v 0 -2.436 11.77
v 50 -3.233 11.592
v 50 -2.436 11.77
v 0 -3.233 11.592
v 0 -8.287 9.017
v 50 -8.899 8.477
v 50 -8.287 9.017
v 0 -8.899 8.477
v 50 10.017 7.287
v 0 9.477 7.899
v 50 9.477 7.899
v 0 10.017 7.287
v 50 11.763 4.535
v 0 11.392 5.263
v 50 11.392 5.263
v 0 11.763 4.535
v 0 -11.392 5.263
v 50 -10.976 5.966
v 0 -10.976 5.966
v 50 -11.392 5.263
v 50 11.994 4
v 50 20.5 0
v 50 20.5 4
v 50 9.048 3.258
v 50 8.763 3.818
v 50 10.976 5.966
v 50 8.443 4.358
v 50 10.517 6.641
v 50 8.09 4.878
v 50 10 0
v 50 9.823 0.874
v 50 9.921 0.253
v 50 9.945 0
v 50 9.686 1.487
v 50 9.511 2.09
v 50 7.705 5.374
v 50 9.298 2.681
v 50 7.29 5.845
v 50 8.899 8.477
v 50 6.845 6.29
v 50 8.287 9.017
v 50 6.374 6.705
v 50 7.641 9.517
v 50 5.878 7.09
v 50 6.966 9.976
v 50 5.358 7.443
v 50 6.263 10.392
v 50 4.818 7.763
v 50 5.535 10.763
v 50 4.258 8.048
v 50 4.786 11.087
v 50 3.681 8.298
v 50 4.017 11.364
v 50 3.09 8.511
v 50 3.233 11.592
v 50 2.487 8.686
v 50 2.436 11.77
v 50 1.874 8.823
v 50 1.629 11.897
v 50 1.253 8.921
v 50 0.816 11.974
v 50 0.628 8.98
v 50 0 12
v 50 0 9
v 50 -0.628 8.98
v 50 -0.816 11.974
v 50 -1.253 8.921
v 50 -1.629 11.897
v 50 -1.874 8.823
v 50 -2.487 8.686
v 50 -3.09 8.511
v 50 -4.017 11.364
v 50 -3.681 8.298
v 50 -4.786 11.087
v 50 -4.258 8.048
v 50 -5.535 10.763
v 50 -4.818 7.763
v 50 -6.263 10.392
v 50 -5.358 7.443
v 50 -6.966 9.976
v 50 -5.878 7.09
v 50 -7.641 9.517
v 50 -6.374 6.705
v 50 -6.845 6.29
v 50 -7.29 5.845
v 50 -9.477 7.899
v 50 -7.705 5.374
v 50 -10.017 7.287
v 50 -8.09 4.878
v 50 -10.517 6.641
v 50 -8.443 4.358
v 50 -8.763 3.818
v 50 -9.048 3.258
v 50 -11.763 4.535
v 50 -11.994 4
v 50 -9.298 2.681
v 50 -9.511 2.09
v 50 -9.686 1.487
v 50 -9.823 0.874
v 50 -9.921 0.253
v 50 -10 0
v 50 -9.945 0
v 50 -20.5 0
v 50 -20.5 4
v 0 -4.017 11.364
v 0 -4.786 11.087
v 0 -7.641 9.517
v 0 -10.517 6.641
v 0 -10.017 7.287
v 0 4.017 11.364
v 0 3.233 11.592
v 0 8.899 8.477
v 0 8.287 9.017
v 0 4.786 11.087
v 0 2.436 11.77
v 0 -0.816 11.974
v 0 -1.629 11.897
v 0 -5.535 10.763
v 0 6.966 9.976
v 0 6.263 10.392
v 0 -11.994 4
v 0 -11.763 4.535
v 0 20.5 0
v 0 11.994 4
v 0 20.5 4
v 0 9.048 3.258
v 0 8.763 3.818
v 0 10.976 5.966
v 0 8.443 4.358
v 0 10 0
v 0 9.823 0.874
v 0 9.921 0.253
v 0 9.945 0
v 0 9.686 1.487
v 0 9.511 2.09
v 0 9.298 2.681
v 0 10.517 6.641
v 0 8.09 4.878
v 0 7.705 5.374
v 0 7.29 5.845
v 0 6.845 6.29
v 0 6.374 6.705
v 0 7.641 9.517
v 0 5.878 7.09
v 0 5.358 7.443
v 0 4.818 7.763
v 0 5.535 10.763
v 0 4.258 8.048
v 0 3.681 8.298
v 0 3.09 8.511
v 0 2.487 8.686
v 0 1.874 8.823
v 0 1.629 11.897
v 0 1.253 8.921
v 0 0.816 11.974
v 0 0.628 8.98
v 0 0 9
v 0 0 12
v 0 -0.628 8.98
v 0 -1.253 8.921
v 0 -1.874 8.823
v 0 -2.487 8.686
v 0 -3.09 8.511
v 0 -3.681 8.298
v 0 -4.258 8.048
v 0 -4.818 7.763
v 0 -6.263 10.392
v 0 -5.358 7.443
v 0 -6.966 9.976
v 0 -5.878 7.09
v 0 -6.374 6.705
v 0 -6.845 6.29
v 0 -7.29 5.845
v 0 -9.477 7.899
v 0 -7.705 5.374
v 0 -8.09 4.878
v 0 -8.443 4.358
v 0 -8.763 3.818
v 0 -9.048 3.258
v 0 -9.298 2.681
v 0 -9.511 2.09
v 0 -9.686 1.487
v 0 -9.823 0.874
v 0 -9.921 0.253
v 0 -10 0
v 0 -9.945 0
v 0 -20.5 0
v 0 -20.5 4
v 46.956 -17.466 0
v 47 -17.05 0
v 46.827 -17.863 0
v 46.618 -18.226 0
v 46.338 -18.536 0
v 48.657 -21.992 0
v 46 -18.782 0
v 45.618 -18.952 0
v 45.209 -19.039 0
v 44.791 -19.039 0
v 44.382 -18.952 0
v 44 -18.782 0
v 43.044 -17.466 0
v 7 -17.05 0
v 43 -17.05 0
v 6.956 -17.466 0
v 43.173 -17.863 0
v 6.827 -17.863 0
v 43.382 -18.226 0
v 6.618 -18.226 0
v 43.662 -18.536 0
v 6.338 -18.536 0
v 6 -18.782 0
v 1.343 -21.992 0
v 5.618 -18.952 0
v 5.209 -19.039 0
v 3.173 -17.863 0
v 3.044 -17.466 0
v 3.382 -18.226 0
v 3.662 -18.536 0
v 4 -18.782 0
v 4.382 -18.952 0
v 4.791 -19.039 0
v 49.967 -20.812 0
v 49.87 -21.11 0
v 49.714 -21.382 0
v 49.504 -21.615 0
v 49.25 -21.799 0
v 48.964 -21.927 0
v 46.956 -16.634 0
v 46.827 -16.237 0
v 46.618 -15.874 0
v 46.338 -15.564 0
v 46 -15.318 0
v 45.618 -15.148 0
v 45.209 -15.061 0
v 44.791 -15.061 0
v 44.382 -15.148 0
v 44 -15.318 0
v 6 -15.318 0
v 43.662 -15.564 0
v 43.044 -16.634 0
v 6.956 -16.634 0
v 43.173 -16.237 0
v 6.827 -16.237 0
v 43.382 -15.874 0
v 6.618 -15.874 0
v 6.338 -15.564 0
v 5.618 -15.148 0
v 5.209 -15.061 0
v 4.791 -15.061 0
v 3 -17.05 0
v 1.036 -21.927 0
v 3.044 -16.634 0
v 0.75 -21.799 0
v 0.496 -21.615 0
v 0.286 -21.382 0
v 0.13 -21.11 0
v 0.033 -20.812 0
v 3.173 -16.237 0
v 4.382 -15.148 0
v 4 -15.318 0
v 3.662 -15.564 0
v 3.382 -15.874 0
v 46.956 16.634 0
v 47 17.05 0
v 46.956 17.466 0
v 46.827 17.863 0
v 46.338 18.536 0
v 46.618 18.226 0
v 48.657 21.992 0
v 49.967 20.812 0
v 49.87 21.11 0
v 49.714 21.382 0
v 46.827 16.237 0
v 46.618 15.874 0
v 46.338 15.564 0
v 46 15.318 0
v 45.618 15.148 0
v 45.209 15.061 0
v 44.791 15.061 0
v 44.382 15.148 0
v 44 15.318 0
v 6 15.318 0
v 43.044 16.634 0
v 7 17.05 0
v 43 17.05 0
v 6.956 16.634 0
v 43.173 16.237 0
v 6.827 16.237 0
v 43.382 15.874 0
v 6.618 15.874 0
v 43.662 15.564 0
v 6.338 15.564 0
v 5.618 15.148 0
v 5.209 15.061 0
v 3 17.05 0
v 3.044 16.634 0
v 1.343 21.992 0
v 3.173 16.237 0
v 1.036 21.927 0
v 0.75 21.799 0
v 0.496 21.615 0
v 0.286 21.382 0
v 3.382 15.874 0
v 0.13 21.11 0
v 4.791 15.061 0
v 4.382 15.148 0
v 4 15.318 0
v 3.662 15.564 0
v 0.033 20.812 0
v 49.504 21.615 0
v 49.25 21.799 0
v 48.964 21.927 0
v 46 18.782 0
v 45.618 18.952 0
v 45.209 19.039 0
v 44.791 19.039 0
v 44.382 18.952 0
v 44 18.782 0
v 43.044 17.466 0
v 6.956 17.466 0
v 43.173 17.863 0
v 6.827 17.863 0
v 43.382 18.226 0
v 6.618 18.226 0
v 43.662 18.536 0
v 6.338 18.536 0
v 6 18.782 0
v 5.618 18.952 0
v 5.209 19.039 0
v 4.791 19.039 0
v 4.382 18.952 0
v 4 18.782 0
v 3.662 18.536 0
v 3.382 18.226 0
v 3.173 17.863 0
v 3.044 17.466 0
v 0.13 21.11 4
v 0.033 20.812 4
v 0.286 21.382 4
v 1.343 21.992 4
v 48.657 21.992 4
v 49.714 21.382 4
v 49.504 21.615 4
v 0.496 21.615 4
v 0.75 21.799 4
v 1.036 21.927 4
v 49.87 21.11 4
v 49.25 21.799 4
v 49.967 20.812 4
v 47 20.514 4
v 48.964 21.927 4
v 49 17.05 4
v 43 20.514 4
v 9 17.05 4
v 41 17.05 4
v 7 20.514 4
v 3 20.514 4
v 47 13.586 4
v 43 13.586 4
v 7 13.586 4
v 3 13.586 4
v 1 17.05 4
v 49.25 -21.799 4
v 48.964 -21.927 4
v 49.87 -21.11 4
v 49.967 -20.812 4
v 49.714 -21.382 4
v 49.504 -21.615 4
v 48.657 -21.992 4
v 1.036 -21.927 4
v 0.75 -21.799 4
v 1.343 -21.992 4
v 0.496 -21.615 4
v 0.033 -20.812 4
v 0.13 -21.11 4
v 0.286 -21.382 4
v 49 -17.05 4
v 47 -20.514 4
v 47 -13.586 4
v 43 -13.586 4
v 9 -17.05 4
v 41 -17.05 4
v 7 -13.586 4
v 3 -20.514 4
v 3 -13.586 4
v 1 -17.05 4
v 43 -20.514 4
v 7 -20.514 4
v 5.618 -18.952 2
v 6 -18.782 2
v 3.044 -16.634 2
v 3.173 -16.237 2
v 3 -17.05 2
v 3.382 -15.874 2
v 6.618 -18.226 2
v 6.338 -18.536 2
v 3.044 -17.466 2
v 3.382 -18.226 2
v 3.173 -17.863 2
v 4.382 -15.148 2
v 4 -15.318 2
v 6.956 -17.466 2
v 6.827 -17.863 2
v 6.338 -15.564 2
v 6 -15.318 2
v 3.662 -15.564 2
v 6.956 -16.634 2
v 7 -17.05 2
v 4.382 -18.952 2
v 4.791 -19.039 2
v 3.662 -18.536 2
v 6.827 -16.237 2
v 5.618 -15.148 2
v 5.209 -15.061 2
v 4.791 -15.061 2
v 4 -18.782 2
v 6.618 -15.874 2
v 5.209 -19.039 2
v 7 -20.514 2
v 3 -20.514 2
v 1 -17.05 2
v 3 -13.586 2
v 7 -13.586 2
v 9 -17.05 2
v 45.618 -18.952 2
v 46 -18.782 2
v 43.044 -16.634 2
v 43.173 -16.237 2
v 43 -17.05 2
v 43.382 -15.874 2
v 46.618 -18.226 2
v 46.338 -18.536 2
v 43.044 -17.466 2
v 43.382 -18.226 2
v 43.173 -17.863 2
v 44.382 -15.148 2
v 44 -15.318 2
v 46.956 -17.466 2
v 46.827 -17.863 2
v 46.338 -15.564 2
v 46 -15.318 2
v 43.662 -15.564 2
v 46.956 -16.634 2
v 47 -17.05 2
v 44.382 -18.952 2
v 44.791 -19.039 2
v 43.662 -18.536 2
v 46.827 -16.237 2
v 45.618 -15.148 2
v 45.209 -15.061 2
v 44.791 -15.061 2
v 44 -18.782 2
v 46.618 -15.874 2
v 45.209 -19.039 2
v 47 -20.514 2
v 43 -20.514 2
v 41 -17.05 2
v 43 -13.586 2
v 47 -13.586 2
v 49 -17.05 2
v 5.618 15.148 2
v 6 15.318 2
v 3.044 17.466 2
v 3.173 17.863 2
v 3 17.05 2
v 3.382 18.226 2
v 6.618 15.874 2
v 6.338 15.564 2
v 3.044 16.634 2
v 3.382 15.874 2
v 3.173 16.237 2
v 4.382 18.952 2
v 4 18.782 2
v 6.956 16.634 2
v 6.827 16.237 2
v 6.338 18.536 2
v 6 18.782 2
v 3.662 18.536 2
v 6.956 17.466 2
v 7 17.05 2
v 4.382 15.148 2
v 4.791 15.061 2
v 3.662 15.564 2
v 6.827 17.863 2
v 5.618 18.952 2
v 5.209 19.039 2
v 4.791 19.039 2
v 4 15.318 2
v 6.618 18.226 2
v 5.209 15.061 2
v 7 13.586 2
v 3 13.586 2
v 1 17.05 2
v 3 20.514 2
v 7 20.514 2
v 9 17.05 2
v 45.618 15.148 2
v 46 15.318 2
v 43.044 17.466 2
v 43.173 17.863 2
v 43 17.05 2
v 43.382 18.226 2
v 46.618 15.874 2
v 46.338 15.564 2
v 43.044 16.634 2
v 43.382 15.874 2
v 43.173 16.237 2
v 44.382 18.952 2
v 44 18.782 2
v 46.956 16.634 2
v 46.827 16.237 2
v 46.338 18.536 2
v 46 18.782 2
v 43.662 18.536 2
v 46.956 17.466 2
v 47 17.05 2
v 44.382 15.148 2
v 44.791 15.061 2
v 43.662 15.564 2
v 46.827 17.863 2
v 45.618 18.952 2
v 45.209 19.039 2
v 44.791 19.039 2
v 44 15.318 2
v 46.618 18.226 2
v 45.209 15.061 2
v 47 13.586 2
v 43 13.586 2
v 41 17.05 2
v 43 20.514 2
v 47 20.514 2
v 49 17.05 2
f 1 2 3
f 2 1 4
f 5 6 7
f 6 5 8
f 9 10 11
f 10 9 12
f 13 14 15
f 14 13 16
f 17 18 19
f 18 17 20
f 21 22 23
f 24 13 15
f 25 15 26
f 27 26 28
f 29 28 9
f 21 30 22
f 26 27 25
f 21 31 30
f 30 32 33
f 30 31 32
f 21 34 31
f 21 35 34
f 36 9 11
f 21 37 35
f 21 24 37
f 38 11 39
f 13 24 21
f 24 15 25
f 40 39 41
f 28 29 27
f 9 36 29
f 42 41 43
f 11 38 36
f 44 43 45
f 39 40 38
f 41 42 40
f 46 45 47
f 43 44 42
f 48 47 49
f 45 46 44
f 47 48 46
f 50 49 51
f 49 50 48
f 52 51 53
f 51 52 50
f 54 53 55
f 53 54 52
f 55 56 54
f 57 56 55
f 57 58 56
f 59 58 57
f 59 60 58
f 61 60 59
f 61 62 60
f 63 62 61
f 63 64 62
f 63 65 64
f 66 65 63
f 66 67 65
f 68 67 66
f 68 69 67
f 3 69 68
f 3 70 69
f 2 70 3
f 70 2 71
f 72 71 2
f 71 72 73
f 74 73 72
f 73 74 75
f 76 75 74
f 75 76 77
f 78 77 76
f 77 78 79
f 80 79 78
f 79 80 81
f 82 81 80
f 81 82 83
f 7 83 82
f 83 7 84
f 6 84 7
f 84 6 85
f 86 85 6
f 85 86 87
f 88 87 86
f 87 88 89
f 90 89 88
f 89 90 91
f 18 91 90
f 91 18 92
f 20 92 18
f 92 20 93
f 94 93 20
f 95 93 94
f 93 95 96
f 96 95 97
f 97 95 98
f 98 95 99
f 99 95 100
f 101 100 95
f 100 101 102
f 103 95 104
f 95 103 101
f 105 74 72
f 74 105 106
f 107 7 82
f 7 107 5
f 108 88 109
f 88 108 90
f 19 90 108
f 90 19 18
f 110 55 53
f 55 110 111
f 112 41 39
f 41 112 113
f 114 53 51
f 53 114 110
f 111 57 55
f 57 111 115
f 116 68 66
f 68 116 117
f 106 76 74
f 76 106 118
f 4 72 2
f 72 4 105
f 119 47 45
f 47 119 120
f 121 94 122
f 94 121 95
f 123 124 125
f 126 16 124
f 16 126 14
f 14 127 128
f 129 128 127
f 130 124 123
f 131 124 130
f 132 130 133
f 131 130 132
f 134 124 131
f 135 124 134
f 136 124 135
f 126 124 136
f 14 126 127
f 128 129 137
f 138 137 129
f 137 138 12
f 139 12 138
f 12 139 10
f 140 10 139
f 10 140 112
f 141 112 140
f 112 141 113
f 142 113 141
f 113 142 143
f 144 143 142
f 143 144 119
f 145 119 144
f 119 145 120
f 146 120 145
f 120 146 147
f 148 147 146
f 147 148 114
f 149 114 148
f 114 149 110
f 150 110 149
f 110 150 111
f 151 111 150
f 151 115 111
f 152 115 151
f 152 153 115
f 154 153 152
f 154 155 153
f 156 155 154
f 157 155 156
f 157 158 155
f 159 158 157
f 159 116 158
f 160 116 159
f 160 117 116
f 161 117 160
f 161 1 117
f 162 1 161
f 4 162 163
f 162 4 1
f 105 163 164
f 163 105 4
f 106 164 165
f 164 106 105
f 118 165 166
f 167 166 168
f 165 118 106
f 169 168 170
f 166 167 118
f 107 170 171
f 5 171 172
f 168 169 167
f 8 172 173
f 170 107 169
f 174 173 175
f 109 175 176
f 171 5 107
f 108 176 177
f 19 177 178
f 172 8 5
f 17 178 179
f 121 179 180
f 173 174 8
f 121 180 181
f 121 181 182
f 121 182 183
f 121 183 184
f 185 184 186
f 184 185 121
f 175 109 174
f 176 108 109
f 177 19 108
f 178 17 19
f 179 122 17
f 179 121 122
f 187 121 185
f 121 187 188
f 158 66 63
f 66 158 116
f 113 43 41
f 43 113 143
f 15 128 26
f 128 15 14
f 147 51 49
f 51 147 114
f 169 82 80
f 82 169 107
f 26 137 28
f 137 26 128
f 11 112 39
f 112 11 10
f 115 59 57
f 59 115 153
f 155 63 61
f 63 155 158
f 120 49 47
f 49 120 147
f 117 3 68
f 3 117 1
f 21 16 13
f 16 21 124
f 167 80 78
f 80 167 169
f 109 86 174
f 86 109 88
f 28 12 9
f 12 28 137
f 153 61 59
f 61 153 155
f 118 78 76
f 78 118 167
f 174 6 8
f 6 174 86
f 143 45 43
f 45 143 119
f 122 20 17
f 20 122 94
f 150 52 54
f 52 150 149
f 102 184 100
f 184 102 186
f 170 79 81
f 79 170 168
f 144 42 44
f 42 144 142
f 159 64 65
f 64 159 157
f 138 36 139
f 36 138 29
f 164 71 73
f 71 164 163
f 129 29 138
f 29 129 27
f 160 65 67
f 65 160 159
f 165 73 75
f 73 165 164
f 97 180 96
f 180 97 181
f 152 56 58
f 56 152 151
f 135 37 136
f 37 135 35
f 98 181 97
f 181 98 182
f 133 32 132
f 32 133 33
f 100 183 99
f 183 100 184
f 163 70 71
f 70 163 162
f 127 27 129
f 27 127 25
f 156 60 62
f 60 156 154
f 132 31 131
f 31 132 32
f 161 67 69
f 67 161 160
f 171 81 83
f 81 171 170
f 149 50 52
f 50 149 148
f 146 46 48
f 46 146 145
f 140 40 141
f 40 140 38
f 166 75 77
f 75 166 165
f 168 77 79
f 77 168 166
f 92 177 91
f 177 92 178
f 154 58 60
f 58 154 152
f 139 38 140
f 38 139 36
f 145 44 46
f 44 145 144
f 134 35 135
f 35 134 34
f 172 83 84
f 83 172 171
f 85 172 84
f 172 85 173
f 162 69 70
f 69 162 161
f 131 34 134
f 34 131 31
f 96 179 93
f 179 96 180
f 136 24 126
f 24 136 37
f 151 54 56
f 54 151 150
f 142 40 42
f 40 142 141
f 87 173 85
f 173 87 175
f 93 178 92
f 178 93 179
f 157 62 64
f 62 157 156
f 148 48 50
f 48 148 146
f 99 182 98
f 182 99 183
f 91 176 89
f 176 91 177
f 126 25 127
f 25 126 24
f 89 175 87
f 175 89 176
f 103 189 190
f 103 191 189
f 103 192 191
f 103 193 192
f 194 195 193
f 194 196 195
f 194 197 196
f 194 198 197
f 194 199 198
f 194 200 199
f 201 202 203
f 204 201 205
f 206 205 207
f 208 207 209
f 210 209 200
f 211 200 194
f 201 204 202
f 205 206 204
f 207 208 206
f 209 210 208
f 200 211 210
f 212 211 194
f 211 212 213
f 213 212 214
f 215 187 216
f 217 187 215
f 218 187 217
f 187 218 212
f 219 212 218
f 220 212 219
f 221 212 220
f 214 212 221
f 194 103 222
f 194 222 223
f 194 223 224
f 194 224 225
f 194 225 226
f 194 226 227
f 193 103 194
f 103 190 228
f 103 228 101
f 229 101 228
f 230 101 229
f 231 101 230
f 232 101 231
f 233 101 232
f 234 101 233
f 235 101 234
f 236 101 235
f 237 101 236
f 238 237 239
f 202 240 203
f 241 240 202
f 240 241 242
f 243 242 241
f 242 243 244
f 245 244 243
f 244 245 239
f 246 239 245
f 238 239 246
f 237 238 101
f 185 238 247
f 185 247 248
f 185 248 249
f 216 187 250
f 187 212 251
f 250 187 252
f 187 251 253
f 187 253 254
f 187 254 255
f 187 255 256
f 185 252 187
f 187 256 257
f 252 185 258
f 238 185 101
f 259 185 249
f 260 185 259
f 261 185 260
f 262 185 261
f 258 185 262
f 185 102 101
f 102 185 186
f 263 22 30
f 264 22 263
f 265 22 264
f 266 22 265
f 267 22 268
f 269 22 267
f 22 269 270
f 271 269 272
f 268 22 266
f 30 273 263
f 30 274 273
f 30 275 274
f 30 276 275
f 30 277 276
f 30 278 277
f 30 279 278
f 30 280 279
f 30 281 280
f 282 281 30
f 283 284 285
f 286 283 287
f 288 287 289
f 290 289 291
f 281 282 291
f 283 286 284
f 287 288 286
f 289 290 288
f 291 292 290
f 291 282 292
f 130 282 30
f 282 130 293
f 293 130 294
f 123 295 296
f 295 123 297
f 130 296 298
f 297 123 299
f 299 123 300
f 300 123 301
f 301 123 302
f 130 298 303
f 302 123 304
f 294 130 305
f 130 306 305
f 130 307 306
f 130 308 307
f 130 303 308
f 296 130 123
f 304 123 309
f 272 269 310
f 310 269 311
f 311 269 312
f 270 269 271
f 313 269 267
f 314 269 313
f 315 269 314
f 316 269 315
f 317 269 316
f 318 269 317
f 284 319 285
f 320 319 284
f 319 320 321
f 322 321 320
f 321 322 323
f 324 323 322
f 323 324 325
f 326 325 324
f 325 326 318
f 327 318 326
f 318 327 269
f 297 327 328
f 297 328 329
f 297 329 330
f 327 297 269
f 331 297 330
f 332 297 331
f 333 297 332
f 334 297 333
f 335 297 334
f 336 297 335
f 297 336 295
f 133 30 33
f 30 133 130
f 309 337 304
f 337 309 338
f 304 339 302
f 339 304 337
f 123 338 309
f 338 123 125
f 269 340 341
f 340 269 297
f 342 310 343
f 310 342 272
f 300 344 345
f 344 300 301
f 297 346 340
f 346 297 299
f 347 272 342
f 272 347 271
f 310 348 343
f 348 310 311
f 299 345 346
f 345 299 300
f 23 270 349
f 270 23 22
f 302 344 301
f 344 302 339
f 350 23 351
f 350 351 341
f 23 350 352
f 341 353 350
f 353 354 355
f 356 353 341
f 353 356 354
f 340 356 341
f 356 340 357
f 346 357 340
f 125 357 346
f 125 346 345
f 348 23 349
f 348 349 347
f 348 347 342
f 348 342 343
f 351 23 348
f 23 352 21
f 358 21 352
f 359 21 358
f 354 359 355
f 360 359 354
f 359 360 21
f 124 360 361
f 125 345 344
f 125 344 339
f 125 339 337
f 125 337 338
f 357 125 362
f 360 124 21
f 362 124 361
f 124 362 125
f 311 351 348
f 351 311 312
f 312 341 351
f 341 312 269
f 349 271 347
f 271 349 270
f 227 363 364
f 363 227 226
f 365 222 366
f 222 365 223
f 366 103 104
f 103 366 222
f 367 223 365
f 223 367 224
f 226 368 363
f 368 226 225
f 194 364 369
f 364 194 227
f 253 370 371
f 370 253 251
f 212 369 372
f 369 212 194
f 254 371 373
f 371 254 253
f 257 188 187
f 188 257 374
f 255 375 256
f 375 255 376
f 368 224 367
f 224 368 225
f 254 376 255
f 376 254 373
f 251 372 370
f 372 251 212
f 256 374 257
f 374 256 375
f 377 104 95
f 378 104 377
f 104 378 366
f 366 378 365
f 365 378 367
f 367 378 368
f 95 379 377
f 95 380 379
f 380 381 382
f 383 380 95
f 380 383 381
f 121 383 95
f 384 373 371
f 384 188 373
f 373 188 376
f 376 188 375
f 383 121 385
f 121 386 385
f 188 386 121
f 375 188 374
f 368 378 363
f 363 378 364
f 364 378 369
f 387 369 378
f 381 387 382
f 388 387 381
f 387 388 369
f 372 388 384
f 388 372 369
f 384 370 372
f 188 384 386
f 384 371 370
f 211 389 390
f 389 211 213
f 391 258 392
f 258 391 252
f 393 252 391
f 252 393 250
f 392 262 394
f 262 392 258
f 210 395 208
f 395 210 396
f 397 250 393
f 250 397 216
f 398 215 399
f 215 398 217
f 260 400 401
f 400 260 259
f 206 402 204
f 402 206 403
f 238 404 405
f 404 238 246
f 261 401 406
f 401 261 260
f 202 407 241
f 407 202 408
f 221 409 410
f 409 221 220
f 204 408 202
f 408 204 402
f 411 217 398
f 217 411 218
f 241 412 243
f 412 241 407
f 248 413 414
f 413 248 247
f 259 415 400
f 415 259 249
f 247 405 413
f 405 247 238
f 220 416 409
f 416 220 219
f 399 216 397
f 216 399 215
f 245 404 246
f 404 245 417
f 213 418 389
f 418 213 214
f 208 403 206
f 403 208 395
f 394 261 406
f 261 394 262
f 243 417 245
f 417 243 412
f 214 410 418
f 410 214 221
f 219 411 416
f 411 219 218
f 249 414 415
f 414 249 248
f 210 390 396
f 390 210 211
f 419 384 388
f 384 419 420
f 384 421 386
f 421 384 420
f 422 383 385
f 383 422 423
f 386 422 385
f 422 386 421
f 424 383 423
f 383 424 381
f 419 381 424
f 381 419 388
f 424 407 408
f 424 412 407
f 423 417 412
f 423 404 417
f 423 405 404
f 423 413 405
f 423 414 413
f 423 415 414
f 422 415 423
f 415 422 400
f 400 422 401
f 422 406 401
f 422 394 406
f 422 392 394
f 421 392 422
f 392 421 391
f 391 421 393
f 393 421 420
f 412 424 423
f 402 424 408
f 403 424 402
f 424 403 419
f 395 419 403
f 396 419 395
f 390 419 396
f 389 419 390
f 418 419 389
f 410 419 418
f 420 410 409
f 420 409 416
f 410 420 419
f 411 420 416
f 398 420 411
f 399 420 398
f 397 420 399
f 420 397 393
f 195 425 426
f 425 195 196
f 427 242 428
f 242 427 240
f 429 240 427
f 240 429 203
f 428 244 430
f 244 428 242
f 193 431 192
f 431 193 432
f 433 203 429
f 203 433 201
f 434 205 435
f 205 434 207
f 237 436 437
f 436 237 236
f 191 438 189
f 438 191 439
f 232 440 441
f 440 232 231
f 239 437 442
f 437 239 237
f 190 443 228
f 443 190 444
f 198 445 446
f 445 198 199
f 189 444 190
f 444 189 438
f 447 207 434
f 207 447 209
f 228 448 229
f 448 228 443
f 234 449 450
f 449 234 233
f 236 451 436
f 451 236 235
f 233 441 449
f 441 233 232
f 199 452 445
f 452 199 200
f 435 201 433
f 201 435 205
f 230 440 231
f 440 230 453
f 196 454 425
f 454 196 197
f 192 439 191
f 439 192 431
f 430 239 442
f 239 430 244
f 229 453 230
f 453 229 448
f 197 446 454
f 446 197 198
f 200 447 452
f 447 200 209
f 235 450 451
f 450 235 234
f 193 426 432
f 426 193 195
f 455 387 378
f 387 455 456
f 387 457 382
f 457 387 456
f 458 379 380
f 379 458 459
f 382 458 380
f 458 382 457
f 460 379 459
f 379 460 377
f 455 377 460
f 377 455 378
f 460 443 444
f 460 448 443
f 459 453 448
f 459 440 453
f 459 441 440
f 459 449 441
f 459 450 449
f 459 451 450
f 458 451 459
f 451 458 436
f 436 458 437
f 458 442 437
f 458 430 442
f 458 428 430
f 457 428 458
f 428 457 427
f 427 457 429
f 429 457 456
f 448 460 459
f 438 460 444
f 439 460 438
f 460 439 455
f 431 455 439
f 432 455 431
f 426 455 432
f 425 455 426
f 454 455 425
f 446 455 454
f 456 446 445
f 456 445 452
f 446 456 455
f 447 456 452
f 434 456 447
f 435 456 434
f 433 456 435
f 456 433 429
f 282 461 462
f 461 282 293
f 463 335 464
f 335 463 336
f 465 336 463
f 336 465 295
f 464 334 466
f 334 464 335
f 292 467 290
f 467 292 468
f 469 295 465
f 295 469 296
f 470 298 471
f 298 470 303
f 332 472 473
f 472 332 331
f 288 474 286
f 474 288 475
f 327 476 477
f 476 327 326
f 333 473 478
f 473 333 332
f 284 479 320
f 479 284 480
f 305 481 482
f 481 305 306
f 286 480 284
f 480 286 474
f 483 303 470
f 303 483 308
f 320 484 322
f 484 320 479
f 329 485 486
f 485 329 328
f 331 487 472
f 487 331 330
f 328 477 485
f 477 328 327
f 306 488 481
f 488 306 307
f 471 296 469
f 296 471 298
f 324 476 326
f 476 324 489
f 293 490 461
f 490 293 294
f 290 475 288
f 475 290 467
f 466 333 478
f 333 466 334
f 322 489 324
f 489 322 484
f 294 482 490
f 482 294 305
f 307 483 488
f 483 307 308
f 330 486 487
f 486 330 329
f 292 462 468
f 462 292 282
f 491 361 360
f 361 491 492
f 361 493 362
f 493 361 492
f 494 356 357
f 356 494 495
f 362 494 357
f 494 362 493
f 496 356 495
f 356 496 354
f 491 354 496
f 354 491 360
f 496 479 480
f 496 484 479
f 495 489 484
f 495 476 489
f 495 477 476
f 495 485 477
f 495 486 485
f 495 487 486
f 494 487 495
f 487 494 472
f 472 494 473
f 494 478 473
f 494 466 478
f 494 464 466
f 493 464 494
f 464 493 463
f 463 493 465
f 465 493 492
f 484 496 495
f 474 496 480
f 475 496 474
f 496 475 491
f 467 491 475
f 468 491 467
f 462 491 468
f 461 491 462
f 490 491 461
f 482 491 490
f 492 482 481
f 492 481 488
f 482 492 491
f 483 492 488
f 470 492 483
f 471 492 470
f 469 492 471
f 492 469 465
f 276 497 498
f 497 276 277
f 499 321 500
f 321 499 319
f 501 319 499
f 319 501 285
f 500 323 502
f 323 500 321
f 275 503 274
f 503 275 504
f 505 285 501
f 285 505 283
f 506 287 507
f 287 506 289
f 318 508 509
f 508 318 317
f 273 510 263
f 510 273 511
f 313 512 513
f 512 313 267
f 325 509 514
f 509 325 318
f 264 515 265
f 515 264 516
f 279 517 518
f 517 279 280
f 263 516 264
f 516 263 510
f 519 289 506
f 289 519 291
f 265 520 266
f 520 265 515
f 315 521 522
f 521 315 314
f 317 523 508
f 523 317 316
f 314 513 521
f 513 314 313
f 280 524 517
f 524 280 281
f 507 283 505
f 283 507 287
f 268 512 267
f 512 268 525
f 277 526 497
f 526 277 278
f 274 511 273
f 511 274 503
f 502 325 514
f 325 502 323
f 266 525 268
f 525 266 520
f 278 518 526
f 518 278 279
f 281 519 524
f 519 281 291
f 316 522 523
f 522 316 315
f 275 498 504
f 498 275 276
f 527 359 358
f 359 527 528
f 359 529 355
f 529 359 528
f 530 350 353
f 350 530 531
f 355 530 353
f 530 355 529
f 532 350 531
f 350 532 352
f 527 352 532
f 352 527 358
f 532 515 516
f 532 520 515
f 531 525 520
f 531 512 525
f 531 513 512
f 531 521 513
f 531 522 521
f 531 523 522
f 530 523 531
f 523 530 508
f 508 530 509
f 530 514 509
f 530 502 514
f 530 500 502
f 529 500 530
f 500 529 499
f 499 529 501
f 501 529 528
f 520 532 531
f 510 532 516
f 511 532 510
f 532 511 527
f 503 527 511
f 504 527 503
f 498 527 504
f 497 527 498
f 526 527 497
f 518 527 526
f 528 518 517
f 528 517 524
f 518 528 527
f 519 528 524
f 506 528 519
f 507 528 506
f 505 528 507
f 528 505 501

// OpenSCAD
// *********************************************
//
// Customizable/parametric clamp script
// Author: indazoo
// Credits : 
//   bardiir   https://www.thingiverse.com/thing:2427479
//   Marko22   https://www.thingiverse.com/thing:2484467
//
// *********************************************

/* [Clamp Definitions] */

//Diameter of the rod or pipe to clamp
clamp_inner_diameter = 20; //[1:200]

//Clamps need some space to apply pressure.
clamp_diameter_offset = 1; //[0:200]

//Clamp length
clamp_length = 50; //[1:200]

//Wall thickness
clamp_wall_thickness = 3; //[1:20]

/* [Plate Definitions] */

//Plate thickness where the screw holes are.
wall_plate_thickness = 4; //[1:20]

//Border around the screw recess.
wall_plate_border = 1; //[1:20]

/* [Screw Definitions] */

//Count of screw holes to be places alongside each side.
num_screws = 2; //[0:20]

//Diameter of screw holes.
screw_diameter = 4; //[1:15]

//Distance of opposite screws. Useful for repair parts where the screw/bolt distance must match. Must be at least larger than the clamps inner diameter. Zero disables this and gives automatic distance depending of clamp size.
screw_opposite_distance = 0; //[0:200]

//Distance for the first and the last screw from the edge. Zero disables this so the holes will placed according to plate border value.
screw_distance_from_edge = 0; //[0:100]

//Diameter of nut trap or screw head diameter (set to 0 to disable).
screw_recess_diameter = 8; //[0:20] 

//Make a recess as nut or round shape.
screw_recess_shape = "nut"; //[nut,round]

//How deep the recess is. Set to zero to get a flat clamp plate.
screw_head_nut_thickness = 2; //[0:20]

/* [Hidden] */
plate_r = clamp_wall_thickness/2;

// Output for thingiverse customizer//

rotate([0,90,0])
clamp(clamp_inner_diameter = clamp_inner_diameter,
            clamp_diameter_offset = clamp_diameter_offset,
            clamp_length = clamp_length,
            clamp_wall_thickness = clamp_wall_thickness,
            wall_plate_thickness = wall_plate_thickness,
            wall_plate_border = wall_plate_border,
            num_screws = num_screws,
            screw_diameter = screw_diameter,
            screw_opposite_distance = screw_opposite_distance,
            screw_distance_from_edge = screw_distance_from_edge,
            screw_recess_diameter = screw_recess_diameter,
            screw_recess_is_nut = screw_recess_shape == "nut" ? true : false,
            screw_head_nut_thickness= screw_head_nut_thickness);


// ************************************
// Samples / output for STL picture
// ************************************
/*
// narrow one screw clamp
translate([0,0,0])
rotate([0,90,0])
clamp(clamp_inner_diameter = 20,
            clamp_diameter_offset = 1,
            clamp_length = 12,
            clamp_wall_thickness = 3,
            wall_plate_thickness = 4,
            wall_plate_border = 2,
            num_screws = 1,
            screw_diameter = 4,
            screw_opposite_distance = 0,
            screw_distance_from_edge = 0,
            screw_recess_diameter = 8,
            screw_recess_is_nut = false,
            screw_head_nut_thickness = 2) ; 
            
translate([15,0,0])
rotate([0,90,0])
clamp(clamp_inner_diameter = 20,
            clamp_diameter_offset = 1,
            clamp_length = 12,
            clamp_wall_thickness = 3,
            wall_plate_thickness = 4,
            wall_plate_border = 2,
            num_screws = 1,
            screw_diameter = 4,
            screw_opposite_distance = 0,
            screw_distance_from_edge = 0,
            screw_recess_diameter = 8,
            screw_recess_is_nut = true,
            screw_head_nut_thickness = 2) ;

// narrow one screw clamp without recess at fixed distance
translate([50,0,0])
rotate([0,90,0])
clamp(clamp_inner_diameter = 20,
            clamp_diameter_offset = 1,
            clamp_length = 12,
            clamp_wall_thickness = 3,
            wall_plate_thickness = 8,
            wall_plate_border = 2,
            num_screws = 1,
            screw_diameter = 4,
            screw_opposite_distance = 36, 
            screw_distance_from_edge = 0,
            screw_recess_diameter = 8,
            screw_recess_is_nut = false,
            screw_head_nut_thickness = 0) ; 
            
translate([65,0,0])
rotate([0,90,0])
clamp(clamp_inner_diameter = 20,
            clamp_diameter_offset = 1,
            clamp_length = 12,
            clamp_wall_thickness = 3,
            wall_plate_thickness = 8,
            wall_plate_border = 2,
            num_screws = 1,
            screw_diameter = 4,
            screw_opposite_distance = 36,
            screw_distance_from_edge = 0,
            screw_recess_diameter = 8,
            screw_recess_is_nut = true,
            screw_head_nut_thickness = 0) ;

            
// Dual screw clamp
translate([0,45,0])
rotate([0,90,0])
clamp(clamp_inner_diameter = 10,
            clamp_diameter_offset = 1,
            clamp_length = 40,
            clamp_wall_thickness = 3,
            wall_plate_thickness = 4,
            wall_plate_border = 1,
            num_screws = 2,
            screw_diameter = 4,
            screw_opposite_distance = 0,
            screw_distance_from_edge = 10,
            screw_recess_diameter = 8,
            screw_recess_is_nut = true,
            screw_head_nut_thickness = 2) ;
translate([50,45,0])
rotate([0,90,0])
clamp(clamp_inner_diameter = 10,
            clamp_diameter_offset = 1,
            clamp_length = 40,
            clamp_wall_thickness = 3,
            wall_plate_thickness = 4,
            wall_plate_border = 1,
            num_screws = 2,
            screw_diameter = 4,
            screw_opposite_distance = 0,
            screw_distance_from_edge = 10,
            screw_recess_diameter = 8,
            screw_recess_is_nut = false,
            screw_head_nut_thickness = 0) ;

// triple screw clamp
translate([0,90,0])
rotate([0,90,0])
clamp(clamp_inner_diameter = 20,
            clamp_diameter_offset = 1,
            clamp_length = 40,
            clamp_wall_thickness = 3,
            wall_plate_thickness = 4,
            wall_plate_border = 1,
            num_screws = 3,
            screw_diameter = 4,
            screw_opposite_distance = 0,
            screw_distance_from_edge = 0,
            screw_recess_diameter = 8,
            screw_recess_is_nut = true,
            screw_head_nut_thickness = 2) ;
translate([50,90,0])
rotate([0,90,0])
clamp(clamp_inner_diameter = 20,
            clamp_diameter_offset = 1,
            clamp_length = 50,
            clamp_wall_thickness = 3,
            wall_plate_thickness = 4,
            wall_plate_border = 1,
            num_screws = 3,
            screw_diameter = 4,
            screw_opposite_distance = 0,
            screw_distance_from_edge = 10,
            screw_recess_diameter = 8,
            screw_recess_is_nut = false,
            screw_head_nut_thickness = 0) ;
*/            
// *****************************************************
// Code
// *****************************************************
           

module clamp(clamp_inner_diameter = 20,
            clamp_diameter_offset = 1,
            clamp_length = 50,
            clamp_wall_thickness = 3,
            wall_plate_thickness = 4,
            wall_plate_border = 1,
            num_screws = 2,
            screw_diameter = 4,
            screw_opposite_distance = 0,
            screw_distance_from_edge = 10,
            screw_recess_diameter = 8,
            screw_recess_is_nut = true,
            screw_head_nut_thickness = 2) 
{
    plate_length_p = plate_length(
                        screw_opposite_distance = screw_opposite_distance,
                        wall_plate_border = wall_plate_border,
                        clamp_wall_thickness = clamp_wall_thickness,
                        clamp_inner_diameter = clamp_inner_diameter, 
                        screw_recess_is_nut = screw_recess_is_nut,
                        screw_recess_diameter = screw_recess_diameter);
    screwhole_distance_from_edge_p = screwhole_distance_from_edge(
                                        num_screws = num_screws,
                                        clamp_length = clamp_length,
                                        screw_distance_from_edge = screw_distance_from_edge,
                                        wall_plate_border = wall_plate_border,
                                        screw_recess_diameter = screw_recess_diameter
                                        );
    screwhole_distance_p = screwhole_distance(num_screws = num_screws,
                            clamp_length = clamp_length,
                            screwhole_distance_from_edge = screwhole_distance_from_edge_p
                            );
    difference()
    {
        //create clamp structure
        union()
        {
            translate([clamp_diameter_offset,0,0])
            difference() 
            {
                cylinder(d=clamp_inner_diameter+clamp_wall_thickness*2,h=clamp_length,$fn=100);
                translate([0,0,-1])
                //remove inner cylinder
                cylinder(d=clamp_inner_diameter,h=clamp_length+2,$fn=100);
                //cut half of clamp
                translate([-clamp_diameter_offset,
                            -(clamp_inner_diameter+clamp_wall_thickness*16)/2,
                            -clamp_length/2])
                    cube([(clamp_inner_diameter+clamp_wall_thickness)*2+1,
                        clamp_inner_diameter+clamp_wall_thickness*16,
                        clamp_length*2]);
            }
            //add plates on the left/right
            translate([0,
                        plate_center_x(clamp_inner_diameter = clamp_inner_diameter,
                                        plate_length = plate_length_p),
                        clamp_length/2])
            rotate([180,0,0])
            plate(plate_length = plate_length_p,
                    wall_plate_thickness = wall_plate_thickness,
                    clamp_length = clamp_length);
            translate([0,
                        -plate_center_x(clamp_inner_diameter = clamp_inner_diameter,
                                        plate_length = plate_length_p),
                        clamp_length/2])
            plate(plate_length = plate_length_p,
                    wall_plate_thickness = wall_plate_thickness,
                    clamp_length = clamp_length);
        }
        //remove screw holes
        if(num_screws > 0)
        {
            translate([0,-screw_center_x(screw_opposite_distance = screw_opposite_distance, 
                            clamp_inner_diameter = clamp_inner_diameter,
                            wall_plate_border = wall_plate_border,
                            screw_recess_is_nut = screw_recess_is_nut,
                            screw_recess_diameter = screw_recess_diameter,
                            plate_length = plate_length_p),
                        0])
               recess(num_screws = num_screws,
                        screw_diameter = screw_diameter, 
                        wall_plate_thickness = wall_plate_thickness,
                        screw_head_nut_thickness = screw_head_nut_thickness,
                        screw_recess_is_nut = screw_recess_is_nut,
                        screw_recess_diameter = screw_recess_diameter,
                        recess_height = screw_head_nut_thickness,
                        screwhole_distance_from_edge = screwhole_distance_from_edge_p,
                        screwhole_distance = screwhole_distance_p);
            translate([0,+screw_center_x(screw_opposite_distance = screw_opposite_distance, 
                            clamp_inner_diameter = clamp_inner_diameter,
                            wall_plate_border = wall_plate_border,
                            screw_recess_is_nut = screw_recess_is_nut,
                            screw_recess_diameter = screw_recess_diameter,
                            plate_length = plate_length_p),
                        0])
                recess(num_screws = num_screws,
                        screw_diameter = screw_diameter, 
                        wall_plate_thickness = wall_plate_thickness,
                        screw_head_nut_thickness = screw_head_nut_thickness,
                        screw_recess_is_nut = screw_recess_is_nut,
                        screw_recess_diameter = screw_recess_diameter,
                        recess_height = screw_head_nut_thickness,
                        screwhole_distance_from_edge = screwhole_distance_from_edge_p,
                        screwhole_distance = screwhole_distance_p);
        }
    }
}

//this function would minimize the width of the clamp but then the counterpart may not have the same width
function screw_recess_virtual_diameter(screw_recess_is_nut = true, 
                                        screw_recess_diameter = 8)
            //0.88 is relation between diameter of nut versus width of flat sides
            //= (screw_recess_is_nut ? screw_recess_diameter*0.88 : screw_recess_diameter);
            = screw_recess_diameter;

function plate_length(screw_opposite_distance = 0,
                    wall_plate_border = 2,
                    clamp_wall_thickness = 3,
                    clamp_inner_diameter = 20, 
                    screw_recess_is_nut = true,
                    screw_recess_diameter = 8
                    )
            = screw_opposite_distance == 0 ?
                screw_recess_virtual_diameter(screw_recess_is_nut = screw_recess_is_nut, 
                                        screw_recess_diameter = screw_recess_diameter)
                + wall_plate_border
                + clamp_wall_thickness
            : (screw_opposite_distance - clamp_inner_diameter)/2 
                + screw_recess_virtual_diameter(screw_recess_is_nut = screw_recess_is_nut, 
                                        screw_recess_diameter = screw_recess_diameter)/2
                + wall_plate_border ;

function plate_center_x(clamp_inner_diameter=20, 
                        plate_length = 10) 
            = clamp_inner_diameter/2 + plate_length/2;

function screw_center_x(screw_opposite_distance = 0, 
                        clamp_inner_diameter = 20,
                        wall_plate_border = 2,
                        screw_recess_is_nut = true,
                        screw_recess_diameter = 8,
                        plate_length = 10
                        ) 
            = screw_opposite_distance > 0 ?
            screw_opposite_distance/2
            :clamp_inner_diameter/2 
                + plate_length 
                - wall_plate_border 
                - screw_recess_virtual_diameter(screw_recess_is_nut = screw_recess_is_nut,
                                                screw_recess_diameter = screw_recess_diameter)/2
                +0.05 ; //correction factor because screw_recess_virtual_diameter() is not exact to prevent ultra thin wall with border = 0

function screwhole_distance_from_edge(num_screws = 2,
                                    clamp_length = 50,
                                    screw_distance_from_edge = 0,
                                    wall_plate_border = 2,
                                    screw_recess_diameter = 8
                                    )
            =
   num_screws == 1 ? clamp_length/2
   : screw_distance_from_edge == 0 || 2*screw_distance_from_edge > clamp_length ? wall_plate_border + screw_recess_diameter/2
   : screw_distance_from_edge; 

function screwhole_distance(num_screws = 2,
                            clamp_length = 50,
                            screwhole_distance_from_edge = 10
                            )
           = num_screws == 1 ? 0 : (clamp_length - 2*screwhole_distance_from_edge) / (num_screws-1) ;

/*
echo("clamp_length",clamp_length);
echo("screwhole_distance_from_edge()",screwhole_distance_from_edge());
echo("screwhole_distance()",screwhole_distance());
echo(clamp_length-screwhole_distance_from_edge()-(screwhole_distance()*1));
*/

module plate(plate_length = 10, wall_plate_thickness = 4, clamp_length = 50)
{
    translate([-wall_plate_thickness,0,0])
    rotate([0,90,0])
    roundedRect([clamp_length,plate_length,wall_plate_thickness],plate_r , $fn=30);
}

module recess(num_screws = 2,
                screw_diameter = 4, 
                wall_plate_thickness = 4,
                screw_head_nut_thickness = 3,
                screw_recess_is_nut = true,
                screw_recess_diameter = true,
                recess_height = 3,
                screwhole_distance_from_edge = 10,
                screwhole_distance = 0
             )
{
    if(num_screws>0)
    {
        for(i=[0:num_screws-1])
        {
            translate([0,0,screwhole_distance_from_edge+screwhole_distance*i])
                screwhole(screw_diameter = screw_diameter, 
                        wall_plate_thickness = wall_plate_thickness,
                        screw_head_nut_thickness = screw_head_nut_thickness,
                        screw_recess_is_nut = screw_recess_is_nut,
                        screw_recess_diameter = screw_recess_diameter,
                        recess_height = recess_height
                        );
        }
    }
}


module screwhole(screw_diameter = 4, 
                wall_plate_thickness = 4,
                screw_head_nut_thickness = 3,
                screw_recess_is_nut = true,
                screw_recess_diameter = true,
                recess_height = 3
                )
{
    rotate([0,90,0])
    union() {
        cylinder(d=screw_diameter, h=wall_plate_thickness+20, $fn=30, center=true);
        if(screw_head_nut_thickness > 0)
        {
            translate([0,0,(-(20+recess_height)/2)- (recess_height == 0 ? wall_plate_thickness +0.01: wall_plate_thickness-recess_height) ])
            if(screw_recess_is_nut)
                cylinder(d=screw_recess_diameter, h=recess_height+20, $fn=6, center=true);
            else
                cylinder(d=screw_recess_diameter, h=recess_height+20, $fn=30, center=true);
        }
    }
}

// size - [x,y,z]
// radius - radius of corners
module roundedRect(size, radius)
{
	x = size[0]-radius;
	y = size[1]-radius;
	z = size[2];

	linear_extrude(height=z)
	hull()
	{
		// place 4 circles in the corners, with the given radius
		translate([(-x/2)+(radius/2), (-y/2)+(radius/2), 0])
		circle(r=radius);
	
		translate([(x/2)-(radius/2), (-y/2)+(radius/2), 0])
		circle(r=radius);
	
		translate([(-x/2)+(radius/2), (y/2)-(radius/2), 0])
        square(size = [radius*2, radius*2], center = true);
	
		translate([(x/2)-(radius/2), (y/2)-(radius/2), 0])
		square(size = [radius*2, radius*2], center = true);
	}
}
